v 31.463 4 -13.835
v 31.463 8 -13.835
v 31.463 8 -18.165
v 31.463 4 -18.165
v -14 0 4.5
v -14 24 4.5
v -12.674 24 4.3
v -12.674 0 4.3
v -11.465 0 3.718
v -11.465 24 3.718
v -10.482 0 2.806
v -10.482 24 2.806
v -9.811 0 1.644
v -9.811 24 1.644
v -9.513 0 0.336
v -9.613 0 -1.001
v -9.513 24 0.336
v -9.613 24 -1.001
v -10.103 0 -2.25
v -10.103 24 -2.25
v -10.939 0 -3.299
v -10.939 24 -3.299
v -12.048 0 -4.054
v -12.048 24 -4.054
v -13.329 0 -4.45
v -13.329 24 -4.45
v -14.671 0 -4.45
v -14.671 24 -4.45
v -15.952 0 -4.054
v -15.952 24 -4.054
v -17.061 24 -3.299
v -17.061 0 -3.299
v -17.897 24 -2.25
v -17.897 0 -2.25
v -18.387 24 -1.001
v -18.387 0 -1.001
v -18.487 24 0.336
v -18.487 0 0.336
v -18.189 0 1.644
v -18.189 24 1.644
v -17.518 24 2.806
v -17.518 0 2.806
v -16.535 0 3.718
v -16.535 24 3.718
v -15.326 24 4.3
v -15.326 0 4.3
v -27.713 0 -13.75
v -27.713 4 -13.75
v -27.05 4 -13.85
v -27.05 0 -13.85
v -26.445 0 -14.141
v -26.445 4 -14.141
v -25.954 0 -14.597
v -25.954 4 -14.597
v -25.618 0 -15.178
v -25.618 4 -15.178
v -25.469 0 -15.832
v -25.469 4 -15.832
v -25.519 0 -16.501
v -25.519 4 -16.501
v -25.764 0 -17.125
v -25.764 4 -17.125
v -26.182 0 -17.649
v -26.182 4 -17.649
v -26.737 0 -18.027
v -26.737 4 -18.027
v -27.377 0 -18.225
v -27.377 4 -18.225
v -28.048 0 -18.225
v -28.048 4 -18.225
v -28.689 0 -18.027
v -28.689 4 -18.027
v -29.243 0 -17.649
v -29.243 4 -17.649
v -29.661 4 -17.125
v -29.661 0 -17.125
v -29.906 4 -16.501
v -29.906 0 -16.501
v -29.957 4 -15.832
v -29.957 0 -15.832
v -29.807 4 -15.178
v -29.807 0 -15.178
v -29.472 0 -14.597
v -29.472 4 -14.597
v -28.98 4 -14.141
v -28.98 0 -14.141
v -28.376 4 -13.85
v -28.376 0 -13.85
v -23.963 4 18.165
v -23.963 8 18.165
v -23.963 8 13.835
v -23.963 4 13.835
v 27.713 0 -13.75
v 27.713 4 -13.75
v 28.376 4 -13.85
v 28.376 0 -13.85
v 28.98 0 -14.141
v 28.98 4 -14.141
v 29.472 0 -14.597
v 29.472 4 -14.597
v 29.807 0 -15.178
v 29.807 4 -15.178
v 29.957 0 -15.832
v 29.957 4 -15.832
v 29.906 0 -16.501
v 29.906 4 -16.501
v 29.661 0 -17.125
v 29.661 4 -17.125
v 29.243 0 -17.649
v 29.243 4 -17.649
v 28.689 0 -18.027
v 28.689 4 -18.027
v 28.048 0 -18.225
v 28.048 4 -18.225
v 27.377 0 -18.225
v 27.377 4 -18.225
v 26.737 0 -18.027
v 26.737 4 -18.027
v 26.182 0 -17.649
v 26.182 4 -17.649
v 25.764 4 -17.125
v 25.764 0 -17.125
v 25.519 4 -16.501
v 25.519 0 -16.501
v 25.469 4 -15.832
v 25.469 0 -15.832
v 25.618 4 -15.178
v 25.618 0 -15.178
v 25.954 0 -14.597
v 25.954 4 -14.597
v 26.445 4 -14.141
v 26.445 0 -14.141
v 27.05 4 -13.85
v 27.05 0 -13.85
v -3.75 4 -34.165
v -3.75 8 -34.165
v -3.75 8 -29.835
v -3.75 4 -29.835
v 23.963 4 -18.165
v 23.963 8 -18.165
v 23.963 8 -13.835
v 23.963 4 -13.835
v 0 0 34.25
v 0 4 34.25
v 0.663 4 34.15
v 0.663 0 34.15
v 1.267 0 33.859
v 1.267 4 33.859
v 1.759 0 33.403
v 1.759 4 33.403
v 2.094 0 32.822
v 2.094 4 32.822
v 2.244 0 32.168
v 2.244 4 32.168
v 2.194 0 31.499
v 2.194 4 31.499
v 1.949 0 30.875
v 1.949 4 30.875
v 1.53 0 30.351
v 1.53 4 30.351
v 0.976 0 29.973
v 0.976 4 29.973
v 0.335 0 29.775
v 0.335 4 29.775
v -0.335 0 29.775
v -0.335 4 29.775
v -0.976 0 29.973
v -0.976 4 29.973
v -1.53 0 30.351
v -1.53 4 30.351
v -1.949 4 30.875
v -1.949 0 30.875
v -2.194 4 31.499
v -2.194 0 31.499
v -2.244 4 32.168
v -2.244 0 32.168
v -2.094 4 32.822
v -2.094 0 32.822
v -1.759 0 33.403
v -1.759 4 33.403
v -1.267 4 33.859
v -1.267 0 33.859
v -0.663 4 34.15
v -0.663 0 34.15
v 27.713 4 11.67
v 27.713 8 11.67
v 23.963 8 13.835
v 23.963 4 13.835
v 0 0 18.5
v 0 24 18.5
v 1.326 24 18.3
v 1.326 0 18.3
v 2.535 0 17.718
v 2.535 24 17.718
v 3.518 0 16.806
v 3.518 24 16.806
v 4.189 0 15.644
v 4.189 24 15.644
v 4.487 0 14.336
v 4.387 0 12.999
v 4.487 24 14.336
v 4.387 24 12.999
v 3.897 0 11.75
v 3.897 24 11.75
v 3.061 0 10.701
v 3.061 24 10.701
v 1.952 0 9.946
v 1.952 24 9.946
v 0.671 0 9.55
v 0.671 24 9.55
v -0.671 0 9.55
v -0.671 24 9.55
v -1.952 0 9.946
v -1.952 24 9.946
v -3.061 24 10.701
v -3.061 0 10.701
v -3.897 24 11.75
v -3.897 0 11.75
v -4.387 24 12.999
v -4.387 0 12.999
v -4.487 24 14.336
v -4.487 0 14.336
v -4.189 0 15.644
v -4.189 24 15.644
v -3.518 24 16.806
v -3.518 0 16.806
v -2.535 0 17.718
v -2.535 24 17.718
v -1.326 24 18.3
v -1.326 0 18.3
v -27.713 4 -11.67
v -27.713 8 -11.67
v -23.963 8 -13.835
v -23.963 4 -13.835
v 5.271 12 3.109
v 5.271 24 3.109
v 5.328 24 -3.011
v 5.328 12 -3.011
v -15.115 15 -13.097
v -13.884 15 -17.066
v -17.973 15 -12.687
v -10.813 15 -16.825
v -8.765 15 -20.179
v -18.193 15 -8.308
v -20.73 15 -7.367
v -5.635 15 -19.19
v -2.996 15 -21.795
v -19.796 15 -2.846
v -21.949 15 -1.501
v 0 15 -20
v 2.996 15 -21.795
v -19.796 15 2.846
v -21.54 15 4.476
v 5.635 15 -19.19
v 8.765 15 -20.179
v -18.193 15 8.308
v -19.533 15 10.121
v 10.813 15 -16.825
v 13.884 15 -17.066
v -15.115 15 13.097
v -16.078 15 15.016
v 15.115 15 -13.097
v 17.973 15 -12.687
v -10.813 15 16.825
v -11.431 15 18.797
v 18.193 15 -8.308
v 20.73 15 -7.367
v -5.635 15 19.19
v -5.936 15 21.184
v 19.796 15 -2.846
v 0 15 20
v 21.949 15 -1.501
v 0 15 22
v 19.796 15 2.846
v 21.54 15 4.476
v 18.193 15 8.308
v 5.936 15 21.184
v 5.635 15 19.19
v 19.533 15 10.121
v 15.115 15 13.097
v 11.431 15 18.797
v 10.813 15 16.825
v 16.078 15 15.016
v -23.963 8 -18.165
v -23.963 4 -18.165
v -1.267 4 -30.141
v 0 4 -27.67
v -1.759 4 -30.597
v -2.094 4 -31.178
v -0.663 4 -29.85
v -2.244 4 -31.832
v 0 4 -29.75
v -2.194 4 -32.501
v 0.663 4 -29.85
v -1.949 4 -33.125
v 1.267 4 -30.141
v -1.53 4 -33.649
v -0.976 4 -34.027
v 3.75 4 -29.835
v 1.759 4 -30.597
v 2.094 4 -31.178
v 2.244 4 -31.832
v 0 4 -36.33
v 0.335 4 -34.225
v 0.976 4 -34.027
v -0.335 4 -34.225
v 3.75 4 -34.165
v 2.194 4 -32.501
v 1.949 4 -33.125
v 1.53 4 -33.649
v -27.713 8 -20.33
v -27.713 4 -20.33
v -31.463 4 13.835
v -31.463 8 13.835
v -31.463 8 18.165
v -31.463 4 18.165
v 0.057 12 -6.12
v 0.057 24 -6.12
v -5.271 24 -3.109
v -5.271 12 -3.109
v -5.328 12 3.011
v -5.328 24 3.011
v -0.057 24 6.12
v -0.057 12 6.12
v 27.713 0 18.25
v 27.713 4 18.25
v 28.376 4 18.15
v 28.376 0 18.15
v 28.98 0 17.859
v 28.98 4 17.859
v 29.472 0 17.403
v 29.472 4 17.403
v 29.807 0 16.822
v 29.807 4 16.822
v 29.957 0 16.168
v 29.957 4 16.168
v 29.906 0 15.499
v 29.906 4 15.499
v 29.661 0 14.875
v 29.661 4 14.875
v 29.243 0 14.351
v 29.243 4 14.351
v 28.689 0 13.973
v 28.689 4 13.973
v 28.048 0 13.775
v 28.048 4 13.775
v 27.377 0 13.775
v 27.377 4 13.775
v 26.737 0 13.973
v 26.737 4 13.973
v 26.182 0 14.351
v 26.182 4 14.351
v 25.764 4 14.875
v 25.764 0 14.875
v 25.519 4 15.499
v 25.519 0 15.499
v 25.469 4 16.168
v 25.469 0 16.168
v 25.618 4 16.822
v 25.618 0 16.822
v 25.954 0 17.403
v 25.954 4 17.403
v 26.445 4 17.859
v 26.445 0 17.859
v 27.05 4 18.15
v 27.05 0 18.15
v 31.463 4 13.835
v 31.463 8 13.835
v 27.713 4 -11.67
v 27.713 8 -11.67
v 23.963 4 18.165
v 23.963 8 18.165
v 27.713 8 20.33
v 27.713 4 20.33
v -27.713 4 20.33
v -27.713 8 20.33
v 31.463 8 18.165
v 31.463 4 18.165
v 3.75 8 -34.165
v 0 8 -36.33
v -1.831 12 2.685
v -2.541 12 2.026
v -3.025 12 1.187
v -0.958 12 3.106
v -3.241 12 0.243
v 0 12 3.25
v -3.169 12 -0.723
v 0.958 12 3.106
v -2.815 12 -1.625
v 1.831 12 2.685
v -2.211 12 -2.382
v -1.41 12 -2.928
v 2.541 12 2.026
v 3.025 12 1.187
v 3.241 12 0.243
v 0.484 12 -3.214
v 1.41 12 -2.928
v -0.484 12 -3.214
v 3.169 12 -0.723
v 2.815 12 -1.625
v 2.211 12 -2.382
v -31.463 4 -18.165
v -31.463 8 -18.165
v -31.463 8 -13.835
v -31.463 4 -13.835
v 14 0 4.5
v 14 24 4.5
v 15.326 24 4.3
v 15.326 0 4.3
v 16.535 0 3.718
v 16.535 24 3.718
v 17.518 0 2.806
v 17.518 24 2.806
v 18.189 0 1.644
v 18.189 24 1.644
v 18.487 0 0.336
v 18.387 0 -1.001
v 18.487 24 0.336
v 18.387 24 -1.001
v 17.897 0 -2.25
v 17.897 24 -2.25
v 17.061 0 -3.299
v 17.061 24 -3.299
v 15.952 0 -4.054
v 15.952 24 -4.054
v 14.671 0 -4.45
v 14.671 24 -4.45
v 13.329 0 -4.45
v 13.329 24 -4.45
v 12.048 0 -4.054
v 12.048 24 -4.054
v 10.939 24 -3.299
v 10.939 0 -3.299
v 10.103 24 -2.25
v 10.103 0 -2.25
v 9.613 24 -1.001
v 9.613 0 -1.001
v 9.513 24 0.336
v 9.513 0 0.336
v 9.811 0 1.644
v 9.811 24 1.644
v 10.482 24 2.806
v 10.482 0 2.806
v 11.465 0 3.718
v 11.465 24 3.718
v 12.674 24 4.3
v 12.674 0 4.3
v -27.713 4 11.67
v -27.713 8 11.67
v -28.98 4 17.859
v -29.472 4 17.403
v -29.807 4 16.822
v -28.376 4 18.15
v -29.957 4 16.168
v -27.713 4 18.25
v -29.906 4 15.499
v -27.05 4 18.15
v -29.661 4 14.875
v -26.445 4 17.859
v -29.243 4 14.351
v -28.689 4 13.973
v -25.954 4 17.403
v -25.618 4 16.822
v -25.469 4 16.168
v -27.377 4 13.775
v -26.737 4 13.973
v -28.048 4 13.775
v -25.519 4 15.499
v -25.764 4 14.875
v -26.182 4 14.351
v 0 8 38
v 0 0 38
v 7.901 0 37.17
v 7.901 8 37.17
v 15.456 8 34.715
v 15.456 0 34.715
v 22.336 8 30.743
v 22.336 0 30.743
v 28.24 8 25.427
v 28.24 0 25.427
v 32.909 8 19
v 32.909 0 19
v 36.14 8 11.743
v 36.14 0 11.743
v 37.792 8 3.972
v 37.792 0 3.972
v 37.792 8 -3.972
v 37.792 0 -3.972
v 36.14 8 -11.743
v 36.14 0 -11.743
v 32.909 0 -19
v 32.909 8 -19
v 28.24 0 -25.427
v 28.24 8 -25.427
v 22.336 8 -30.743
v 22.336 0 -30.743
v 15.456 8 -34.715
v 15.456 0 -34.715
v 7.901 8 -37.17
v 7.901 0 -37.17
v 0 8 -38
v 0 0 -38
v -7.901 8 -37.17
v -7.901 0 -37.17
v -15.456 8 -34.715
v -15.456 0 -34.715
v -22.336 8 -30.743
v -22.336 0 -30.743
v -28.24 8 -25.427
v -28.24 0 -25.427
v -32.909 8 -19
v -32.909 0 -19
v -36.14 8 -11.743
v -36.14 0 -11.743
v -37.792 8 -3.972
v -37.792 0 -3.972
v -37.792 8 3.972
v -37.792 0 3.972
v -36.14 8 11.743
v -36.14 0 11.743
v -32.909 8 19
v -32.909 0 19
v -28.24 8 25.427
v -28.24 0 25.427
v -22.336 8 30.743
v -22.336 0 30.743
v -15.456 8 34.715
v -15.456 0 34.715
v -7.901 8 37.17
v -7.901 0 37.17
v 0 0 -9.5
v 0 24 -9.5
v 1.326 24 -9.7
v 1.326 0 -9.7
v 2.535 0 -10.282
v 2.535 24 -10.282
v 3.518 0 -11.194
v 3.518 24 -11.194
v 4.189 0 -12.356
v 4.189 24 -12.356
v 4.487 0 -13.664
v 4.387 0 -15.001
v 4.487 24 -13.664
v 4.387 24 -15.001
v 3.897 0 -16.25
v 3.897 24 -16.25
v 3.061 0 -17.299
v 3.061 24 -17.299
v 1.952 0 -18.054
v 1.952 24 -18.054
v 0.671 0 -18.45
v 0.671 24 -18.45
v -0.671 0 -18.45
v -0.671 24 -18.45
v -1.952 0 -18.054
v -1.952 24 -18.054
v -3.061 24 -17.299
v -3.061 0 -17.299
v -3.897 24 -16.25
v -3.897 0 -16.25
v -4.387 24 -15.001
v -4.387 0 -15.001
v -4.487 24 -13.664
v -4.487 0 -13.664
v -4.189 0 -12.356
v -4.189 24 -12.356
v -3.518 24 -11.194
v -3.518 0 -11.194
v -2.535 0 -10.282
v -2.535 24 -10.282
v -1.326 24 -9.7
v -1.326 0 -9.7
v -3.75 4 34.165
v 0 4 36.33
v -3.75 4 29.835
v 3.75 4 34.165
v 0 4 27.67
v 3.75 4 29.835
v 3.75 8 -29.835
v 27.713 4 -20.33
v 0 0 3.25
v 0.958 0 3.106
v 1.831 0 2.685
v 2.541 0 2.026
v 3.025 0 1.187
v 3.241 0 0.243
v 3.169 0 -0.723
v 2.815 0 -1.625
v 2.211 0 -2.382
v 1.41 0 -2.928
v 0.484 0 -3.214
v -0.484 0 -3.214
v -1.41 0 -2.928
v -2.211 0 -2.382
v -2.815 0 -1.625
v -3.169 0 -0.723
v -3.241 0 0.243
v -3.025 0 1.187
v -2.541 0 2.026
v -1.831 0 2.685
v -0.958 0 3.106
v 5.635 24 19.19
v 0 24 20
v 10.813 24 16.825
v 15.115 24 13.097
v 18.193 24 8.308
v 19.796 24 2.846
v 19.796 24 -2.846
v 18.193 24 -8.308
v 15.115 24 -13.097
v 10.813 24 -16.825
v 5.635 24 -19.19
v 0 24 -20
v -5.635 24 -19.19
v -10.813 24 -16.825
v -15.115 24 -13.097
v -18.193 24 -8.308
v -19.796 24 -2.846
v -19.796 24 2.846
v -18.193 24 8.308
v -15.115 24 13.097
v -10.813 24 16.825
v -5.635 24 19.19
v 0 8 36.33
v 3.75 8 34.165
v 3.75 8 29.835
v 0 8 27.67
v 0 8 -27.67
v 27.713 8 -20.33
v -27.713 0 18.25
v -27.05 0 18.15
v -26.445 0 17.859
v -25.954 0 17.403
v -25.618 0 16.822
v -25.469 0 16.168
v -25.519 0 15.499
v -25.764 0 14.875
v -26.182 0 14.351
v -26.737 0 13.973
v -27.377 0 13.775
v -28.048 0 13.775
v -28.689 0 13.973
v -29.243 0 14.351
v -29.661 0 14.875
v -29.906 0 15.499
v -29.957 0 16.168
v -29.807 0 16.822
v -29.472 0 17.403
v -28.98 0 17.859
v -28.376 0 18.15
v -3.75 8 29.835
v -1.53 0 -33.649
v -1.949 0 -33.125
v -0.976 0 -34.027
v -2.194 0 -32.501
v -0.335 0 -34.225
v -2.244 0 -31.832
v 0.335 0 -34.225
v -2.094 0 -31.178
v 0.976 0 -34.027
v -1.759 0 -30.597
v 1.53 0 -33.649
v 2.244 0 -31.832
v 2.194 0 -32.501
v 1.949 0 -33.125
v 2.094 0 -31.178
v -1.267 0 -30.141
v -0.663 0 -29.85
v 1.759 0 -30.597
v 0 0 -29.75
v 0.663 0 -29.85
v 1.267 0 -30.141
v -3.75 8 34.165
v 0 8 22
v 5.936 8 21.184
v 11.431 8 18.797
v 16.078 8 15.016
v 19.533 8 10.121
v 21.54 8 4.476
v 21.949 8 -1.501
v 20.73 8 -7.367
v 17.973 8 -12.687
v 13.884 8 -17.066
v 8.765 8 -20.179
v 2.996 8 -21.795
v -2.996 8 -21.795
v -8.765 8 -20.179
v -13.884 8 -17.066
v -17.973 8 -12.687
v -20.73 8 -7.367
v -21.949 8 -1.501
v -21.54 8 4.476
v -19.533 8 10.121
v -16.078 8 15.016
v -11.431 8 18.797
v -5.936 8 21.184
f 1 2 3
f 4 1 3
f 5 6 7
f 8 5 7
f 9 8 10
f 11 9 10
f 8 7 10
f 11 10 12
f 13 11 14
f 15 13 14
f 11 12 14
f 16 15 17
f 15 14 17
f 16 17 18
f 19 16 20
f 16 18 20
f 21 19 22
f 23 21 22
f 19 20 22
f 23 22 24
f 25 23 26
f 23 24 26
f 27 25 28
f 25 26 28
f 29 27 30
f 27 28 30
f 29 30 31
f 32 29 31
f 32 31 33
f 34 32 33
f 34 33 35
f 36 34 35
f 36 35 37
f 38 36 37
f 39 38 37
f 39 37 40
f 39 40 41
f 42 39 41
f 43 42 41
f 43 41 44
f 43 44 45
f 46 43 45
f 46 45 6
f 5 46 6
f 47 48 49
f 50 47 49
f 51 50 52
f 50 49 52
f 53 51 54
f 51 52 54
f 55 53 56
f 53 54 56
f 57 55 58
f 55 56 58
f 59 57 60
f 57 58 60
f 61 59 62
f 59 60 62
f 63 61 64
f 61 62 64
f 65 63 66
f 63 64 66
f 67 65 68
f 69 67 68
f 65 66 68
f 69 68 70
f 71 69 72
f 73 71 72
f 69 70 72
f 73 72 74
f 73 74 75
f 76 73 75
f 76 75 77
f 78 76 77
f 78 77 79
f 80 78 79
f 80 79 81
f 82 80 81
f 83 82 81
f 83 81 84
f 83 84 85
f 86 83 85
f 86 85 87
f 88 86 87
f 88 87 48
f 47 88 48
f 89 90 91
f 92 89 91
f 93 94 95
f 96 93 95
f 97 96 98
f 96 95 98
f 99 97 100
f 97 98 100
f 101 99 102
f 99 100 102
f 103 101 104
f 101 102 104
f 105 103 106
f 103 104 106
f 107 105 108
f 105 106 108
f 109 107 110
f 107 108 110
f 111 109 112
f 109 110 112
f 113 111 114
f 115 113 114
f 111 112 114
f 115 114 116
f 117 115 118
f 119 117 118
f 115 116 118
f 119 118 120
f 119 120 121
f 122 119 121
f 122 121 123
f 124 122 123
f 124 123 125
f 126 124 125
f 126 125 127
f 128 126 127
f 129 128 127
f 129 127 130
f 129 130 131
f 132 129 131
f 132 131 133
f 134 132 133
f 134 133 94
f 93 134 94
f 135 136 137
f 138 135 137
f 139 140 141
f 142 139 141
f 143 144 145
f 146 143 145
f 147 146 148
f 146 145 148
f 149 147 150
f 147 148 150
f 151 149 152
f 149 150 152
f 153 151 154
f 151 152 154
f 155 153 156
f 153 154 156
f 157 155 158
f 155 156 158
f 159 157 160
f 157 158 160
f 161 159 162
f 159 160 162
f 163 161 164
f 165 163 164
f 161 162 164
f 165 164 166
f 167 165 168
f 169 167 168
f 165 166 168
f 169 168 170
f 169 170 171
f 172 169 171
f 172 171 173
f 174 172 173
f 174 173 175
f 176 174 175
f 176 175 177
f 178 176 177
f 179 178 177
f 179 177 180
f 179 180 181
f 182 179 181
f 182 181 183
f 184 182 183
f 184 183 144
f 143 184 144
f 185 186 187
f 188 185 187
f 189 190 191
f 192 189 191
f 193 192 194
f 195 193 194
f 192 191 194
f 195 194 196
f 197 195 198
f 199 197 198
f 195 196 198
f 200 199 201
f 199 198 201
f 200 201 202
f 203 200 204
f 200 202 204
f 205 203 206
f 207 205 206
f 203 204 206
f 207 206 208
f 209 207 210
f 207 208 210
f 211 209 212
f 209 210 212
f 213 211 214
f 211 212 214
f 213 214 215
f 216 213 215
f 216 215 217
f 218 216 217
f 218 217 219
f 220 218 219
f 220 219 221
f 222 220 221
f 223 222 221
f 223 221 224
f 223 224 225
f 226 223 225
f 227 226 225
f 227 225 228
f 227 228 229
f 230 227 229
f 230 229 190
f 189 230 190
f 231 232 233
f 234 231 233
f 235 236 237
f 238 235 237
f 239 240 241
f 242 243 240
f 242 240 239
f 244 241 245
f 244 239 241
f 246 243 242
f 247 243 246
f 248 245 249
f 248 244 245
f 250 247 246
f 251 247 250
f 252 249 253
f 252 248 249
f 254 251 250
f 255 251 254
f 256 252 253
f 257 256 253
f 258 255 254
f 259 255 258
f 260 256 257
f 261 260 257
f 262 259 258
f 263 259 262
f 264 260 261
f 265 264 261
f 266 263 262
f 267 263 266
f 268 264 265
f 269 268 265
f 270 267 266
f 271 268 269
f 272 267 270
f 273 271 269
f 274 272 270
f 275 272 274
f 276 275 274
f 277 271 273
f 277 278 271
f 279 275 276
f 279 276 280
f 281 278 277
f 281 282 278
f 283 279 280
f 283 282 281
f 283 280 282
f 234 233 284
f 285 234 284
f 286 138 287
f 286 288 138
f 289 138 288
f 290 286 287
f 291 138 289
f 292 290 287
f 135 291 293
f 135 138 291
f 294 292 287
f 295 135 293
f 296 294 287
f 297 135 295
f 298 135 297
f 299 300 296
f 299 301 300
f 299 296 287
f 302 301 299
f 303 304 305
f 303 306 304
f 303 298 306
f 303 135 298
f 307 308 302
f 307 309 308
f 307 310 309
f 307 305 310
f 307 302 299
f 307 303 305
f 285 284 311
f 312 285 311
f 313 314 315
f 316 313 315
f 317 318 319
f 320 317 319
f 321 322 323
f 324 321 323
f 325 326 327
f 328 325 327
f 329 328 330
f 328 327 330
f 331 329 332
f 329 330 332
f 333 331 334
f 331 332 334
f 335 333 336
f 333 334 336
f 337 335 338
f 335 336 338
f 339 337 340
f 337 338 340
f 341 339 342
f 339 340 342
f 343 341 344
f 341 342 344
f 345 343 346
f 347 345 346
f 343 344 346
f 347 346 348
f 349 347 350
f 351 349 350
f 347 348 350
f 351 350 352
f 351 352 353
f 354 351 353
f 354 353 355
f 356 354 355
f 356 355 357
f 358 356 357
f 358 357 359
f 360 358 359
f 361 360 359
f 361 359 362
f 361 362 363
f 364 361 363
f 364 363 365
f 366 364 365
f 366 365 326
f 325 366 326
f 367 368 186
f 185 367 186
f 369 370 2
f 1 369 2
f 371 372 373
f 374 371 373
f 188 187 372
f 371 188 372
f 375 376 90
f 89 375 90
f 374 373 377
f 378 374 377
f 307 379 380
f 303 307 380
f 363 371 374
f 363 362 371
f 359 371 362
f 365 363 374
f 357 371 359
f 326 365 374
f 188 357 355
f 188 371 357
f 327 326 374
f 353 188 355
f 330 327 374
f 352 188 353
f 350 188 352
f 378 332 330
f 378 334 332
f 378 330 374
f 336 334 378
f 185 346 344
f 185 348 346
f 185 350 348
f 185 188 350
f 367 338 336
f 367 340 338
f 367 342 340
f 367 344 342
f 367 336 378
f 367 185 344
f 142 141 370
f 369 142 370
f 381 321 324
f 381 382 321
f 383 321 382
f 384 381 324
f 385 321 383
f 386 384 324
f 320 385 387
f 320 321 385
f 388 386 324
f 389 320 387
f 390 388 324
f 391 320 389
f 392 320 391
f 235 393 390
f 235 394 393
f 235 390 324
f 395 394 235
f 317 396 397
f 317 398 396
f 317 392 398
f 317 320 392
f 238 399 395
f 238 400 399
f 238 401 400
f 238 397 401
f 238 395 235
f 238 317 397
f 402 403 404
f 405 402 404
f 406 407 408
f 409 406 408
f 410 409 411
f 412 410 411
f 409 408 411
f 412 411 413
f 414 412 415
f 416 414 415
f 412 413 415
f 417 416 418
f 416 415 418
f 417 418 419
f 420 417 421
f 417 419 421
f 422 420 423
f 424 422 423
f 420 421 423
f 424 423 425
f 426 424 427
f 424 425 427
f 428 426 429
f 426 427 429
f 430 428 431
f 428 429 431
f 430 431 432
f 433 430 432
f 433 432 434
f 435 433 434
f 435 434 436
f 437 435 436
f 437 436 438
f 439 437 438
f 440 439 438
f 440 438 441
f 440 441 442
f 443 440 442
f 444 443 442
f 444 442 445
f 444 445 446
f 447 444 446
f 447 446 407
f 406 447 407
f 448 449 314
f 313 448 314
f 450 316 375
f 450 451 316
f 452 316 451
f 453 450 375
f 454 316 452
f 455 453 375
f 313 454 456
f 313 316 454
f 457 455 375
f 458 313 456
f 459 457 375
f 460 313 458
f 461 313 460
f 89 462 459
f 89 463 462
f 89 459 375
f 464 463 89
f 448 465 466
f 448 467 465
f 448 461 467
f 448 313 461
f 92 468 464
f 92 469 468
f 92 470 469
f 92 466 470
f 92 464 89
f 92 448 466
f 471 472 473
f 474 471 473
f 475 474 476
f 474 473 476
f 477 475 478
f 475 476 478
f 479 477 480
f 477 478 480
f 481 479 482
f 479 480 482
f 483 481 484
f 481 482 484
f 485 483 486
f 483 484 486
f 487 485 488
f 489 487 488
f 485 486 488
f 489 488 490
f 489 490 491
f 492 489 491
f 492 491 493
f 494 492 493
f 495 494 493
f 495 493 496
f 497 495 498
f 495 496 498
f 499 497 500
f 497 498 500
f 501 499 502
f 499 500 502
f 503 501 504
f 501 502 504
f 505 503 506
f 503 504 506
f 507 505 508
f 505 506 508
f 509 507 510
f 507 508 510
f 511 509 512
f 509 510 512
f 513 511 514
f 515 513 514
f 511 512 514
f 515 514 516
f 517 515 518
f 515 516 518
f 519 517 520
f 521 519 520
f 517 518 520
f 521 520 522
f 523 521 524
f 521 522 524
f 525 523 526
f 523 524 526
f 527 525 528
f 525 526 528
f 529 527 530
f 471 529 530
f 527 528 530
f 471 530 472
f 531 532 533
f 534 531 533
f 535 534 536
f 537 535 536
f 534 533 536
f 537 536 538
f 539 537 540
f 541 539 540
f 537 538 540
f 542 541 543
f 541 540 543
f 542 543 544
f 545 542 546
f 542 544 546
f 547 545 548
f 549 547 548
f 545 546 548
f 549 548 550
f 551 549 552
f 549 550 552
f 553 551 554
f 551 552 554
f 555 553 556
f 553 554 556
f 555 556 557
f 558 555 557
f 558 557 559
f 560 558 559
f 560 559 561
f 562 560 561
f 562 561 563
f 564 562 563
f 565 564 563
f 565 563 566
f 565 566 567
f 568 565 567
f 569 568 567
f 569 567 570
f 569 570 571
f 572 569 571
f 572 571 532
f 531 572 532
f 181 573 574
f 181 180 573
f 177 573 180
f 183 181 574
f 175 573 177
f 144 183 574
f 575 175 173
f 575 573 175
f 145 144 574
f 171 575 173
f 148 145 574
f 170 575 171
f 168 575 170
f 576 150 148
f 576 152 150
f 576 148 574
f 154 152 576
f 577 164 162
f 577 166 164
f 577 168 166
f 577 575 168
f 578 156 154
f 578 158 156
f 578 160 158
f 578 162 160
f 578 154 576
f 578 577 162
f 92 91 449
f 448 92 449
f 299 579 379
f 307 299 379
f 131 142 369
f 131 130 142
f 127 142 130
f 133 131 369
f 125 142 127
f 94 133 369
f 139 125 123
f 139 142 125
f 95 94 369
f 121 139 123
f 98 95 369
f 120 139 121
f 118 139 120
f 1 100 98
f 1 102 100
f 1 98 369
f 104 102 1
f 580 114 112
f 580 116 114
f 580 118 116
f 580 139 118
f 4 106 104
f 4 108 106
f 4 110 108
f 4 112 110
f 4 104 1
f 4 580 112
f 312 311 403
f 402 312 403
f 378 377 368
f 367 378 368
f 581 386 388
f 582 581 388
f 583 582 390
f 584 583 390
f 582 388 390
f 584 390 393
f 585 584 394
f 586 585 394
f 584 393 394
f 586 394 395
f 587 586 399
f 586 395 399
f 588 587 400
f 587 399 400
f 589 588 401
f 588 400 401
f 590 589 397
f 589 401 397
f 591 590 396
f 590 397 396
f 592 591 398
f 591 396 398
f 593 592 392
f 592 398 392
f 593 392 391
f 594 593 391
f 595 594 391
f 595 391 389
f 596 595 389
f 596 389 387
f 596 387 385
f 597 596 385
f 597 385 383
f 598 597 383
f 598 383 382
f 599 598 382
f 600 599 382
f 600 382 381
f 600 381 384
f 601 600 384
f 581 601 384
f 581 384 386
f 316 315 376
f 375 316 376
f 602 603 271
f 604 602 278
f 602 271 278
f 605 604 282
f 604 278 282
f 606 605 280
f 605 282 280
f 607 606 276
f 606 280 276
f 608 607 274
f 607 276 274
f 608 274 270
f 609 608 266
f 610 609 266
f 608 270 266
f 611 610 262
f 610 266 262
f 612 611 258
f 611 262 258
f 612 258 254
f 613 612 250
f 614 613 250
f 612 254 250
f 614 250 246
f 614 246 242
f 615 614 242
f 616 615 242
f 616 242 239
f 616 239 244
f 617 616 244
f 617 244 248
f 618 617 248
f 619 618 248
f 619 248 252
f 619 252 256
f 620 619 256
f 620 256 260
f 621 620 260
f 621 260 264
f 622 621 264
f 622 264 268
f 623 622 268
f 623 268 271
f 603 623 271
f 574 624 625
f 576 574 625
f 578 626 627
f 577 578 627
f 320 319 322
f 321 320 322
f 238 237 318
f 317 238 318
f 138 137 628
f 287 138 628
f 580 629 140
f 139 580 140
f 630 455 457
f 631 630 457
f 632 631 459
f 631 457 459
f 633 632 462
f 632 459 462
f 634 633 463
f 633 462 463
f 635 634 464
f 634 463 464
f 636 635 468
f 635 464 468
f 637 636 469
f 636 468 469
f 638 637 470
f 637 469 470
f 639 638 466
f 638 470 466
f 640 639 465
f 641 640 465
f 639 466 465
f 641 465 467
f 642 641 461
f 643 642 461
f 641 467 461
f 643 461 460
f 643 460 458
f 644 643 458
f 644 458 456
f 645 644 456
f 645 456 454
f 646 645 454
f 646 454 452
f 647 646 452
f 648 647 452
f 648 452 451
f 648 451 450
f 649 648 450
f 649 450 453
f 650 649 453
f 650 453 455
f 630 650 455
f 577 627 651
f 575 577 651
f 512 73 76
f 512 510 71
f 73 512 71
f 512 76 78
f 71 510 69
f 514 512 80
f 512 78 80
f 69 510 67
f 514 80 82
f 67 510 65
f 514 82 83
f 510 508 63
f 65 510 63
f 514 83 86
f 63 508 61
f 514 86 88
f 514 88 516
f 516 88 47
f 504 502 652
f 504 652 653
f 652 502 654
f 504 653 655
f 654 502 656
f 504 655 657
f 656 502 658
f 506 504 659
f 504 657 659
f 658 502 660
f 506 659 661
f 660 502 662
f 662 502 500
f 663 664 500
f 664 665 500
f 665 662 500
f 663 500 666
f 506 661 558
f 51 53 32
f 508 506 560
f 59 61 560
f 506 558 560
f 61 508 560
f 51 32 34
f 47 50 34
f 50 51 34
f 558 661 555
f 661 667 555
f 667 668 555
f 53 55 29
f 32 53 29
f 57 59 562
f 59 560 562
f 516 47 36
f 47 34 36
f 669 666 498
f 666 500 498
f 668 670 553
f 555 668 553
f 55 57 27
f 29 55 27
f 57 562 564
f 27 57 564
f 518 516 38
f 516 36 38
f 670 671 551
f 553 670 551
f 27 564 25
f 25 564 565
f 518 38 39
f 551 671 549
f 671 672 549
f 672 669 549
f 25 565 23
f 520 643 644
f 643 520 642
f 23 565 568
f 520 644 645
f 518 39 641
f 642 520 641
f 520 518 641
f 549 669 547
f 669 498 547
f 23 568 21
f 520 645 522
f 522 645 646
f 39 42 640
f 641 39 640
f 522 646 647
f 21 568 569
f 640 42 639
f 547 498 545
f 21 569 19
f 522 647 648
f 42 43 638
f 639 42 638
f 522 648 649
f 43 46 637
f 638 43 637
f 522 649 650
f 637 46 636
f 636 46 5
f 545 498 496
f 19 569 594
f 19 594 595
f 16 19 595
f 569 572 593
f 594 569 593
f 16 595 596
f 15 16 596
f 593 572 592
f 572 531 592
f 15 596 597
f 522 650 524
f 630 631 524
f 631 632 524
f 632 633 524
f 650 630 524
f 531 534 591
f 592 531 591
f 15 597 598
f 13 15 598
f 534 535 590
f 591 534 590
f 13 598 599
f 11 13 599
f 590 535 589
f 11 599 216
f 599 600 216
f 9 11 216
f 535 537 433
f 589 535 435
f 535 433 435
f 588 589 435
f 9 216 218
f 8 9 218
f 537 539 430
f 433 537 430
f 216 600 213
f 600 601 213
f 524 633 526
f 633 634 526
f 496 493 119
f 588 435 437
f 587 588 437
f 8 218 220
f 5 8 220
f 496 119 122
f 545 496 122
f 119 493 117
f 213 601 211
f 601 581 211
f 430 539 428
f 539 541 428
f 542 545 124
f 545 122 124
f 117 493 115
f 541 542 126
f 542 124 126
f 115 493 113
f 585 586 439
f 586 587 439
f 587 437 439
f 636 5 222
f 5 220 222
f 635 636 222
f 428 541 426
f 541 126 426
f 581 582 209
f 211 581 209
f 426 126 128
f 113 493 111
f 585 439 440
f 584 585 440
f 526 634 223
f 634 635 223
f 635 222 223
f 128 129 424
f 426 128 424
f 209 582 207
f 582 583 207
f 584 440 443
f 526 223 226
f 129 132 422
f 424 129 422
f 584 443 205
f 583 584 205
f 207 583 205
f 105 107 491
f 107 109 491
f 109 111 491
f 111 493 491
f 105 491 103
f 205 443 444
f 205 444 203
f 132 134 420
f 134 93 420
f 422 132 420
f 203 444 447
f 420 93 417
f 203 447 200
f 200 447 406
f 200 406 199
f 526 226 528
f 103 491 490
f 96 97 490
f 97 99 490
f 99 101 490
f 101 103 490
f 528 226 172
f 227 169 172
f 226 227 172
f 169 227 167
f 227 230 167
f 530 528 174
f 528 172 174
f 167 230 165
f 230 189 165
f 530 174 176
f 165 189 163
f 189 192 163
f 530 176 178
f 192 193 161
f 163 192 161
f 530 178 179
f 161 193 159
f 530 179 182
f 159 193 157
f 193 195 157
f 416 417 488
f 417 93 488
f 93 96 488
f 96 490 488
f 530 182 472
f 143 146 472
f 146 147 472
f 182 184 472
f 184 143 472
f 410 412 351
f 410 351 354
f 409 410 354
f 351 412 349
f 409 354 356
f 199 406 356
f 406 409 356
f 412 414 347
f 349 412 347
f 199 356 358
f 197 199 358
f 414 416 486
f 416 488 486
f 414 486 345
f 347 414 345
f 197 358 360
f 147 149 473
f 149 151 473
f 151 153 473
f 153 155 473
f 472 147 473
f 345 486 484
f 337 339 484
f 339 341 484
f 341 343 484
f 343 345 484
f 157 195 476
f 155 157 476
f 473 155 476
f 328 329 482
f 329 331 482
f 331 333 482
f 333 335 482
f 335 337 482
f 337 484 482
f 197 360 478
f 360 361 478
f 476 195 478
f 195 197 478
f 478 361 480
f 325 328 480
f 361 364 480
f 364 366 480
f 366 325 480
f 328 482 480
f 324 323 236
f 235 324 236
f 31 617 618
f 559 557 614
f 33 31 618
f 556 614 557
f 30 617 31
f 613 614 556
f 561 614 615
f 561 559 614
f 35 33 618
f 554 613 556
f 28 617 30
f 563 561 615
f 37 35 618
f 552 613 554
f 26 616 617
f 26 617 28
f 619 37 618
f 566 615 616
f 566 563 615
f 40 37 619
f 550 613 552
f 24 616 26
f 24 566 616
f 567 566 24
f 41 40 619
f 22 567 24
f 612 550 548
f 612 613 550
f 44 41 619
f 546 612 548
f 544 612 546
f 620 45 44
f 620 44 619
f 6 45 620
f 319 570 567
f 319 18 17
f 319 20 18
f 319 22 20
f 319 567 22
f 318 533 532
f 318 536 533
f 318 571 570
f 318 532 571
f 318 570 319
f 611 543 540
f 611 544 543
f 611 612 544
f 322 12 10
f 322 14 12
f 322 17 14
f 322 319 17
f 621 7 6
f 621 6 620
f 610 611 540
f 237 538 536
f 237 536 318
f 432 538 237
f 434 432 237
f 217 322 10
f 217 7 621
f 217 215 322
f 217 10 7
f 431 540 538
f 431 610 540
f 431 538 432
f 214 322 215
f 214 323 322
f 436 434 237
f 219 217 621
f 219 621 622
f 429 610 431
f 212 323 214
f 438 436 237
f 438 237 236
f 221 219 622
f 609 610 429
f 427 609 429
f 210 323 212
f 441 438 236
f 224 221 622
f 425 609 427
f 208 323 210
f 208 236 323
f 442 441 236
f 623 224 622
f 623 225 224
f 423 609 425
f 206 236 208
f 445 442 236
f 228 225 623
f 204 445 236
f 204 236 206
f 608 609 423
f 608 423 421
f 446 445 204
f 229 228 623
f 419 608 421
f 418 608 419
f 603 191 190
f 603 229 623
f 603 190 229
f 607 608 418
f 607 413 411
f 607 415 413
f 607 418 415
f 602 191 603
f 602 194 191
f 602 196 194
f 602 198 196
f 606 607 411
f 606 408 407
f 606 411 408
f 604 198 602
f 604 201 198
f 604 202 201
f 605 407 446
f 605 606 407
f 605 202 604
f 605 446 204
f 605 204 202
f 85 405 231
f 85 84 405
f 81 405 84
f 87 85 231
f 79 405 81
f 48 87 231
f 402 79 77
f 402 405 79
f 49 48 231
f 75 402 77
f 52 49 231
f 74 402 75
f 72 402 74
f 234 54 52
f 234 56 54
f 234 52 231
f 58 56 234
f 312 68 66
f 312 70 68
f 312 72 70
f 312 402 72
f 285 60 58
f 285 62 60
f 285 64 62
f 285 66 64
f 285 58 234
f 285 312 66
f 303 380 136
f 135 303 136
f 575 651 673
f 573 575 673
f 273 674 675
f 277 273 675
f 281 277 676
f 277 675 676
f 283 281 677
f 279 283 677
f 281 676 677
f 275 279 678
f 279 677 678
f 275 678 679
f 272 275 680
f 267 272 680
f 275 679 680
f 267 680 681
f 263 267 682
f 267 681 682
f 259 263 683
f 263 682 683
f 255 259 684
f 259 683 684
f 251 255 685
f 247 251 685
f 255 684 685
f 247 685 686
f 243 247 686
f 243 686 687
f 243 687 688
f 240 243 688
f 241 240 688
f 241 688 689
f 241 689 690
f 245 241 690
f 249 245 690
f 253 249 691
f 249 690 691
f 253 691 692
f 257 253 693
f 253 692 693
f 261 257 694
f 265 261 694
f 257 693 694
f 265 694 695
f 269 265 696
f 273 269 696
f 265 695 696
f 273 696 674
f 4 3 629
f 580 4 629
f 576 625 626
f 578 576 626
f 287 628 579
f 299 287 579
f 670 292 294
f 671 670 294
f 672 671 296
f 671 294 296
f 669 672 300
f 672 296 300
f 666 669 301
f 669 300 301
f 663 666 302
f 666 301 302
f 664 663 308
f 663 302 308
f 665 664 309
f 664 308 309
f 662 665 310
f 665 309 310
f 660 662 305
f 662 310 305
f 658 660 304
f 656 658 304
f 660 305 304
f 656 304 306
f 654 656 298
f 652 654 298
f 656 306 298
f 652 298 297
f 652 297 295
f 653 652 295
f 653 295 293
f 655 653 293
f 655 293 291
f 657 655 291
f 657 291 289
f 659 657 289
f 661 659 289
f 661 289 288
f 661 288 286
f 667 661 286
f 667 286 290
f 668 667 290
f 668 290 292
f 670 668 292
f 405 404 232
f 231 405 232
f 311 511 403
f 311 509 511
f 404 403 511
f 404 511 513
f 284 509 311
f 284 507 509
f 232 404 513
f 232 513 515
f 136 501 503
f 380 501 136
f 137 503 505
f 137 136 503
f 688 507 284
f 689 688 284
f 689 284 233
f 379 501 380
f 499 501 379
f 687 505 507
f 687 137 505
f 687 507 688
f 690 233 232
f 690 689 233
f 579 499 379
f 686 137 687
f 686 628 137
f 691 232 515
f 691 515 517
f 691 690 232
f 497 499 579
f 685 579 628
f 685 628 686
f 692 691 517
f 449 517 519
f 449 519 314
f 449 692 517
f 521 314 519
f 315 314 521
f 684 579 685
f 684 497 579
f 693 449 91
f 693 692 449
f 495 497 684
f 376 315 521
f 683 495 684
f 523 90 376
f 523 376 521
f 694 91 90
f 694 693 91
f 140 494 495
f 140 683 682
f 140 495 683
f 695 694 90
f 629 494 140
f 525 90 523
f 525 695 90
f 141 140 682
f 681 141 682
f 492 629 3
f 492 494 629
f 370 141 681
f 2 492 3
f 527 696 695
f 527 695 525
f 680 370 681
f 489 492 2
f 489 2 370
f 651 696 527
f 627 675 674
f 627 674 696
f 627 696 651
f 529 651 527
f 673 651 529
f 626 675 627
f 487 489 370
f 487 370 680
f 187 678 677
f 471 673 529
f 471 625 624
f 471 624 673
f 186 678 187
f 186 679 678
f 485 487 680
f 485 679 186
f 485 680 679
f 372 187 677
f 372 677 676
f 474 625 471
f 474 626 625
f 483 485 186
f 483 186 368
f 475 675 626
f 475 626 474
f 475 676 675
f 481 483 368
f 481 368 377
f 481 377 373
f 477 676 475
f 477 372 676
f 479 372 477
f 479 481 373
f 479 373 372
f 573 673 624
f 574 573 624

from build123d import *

# Parameters (mm, degrees)
SKETCH_1_R          = 38
EXTRUDE_1_DEPTH     = 8
SKETCH_2_R          = 20
EXTRUDE_2_DEPTH     = 16
SKETCH_7_R          = 22
EXTRUDE_3_DEPTH     = 7
SKETCH_3_R          = 4.5
SKETCH_3_R_2        = 3.25
CUT_EXTRUDE_1_DEPTH = 59.855755878
CUT_EXTRUDE_2_DEPTH = 12
SKETCH_5_R          = 2.25
CUT_EXTRUDE_3_DEPTH = 59.855755878
CUT_EXTRUDE_4_DEPTH = 4


with BuildPart() as part:
    # Эскиз1 → Бобышка-Вытянуть1 (new body)
    with BuildSketch(Plane(origin=(0, 0, 0), x_dir=(1, 0, 0), z_dir=(0, 1, 0))):
        with Locations(Location((0, 0, 0), (0, 0, 270))):
            Circle(SKETCH_1_R)
    extrude(amount=EXTRUDE_1_DEPTH)

    # Эскиз2 → Бобышка-Вытянуть2 (add)
    with BuildSketch(Plane(origin=(0, 8, 0), x_dir=(1, 0, 0), z_dir=(0, 1, 0))):
        with Locations(Location((0, 0, 0), (0, 0, 270))):
            Circle(SKETCH_2_R)
    extrude(amount=EXTRUDE_2_DEPTH)

    # Эскиз7 → Бобышка-Вытянуть3 (add)
    with BuildSketch(Plane(origin=(0, 8, 0), x_dir=(1, 0, 0), z_dir=(0, 1, 0))):
        with Locations(Location((0, 0, 0), (0, 0, 270))):
            Circle(SKETCH_7_R)
    extrude(amount=EXTRUDE_3_DEPTH)

    # Эскиз3 → Вырез-Вытянуть1 (cut, through all)
    with BuildSketch(Plane(origin=(0, 24, 0), x_dir=(1, 0, 0), z_dir=(0, 1, 0))):
        with Locations(Location((0, 14, 0), (0, 0, 270))):
            Circle(SKETCH_3_R)
        with Locations(Location((14, 0, 0), (0, 0, 270))):
            Circle(SKETCH_3_R)
        with Locations(Location((0, -14, 0), (0, 0, 270))):
            Circle(SKETCH_3_R)
        with Locations(Location((-14, 0, 0), (0, 0, 270))):
            Circle(SKETCH_3_R)
        with Locations(Location((0, 0, 0), (0, 0, 270))):
            Circle(SKETCH_3_R_2)
    extrude(amount=-CUT_EXTRUDE_1_DEPTH, mode=Mode.SUBTRACT)

    # Эскиз4 → Вырез-Вытянуть2 (cut)
    with BuildSketch(Plane(origin=(0, 24, 0), x_dir=(1, 0, 0), z_dir=(0, 1, 0))):
        Polygon((5.271310529, -3.109118628), (5.32823098, 3.010529515), (0.056920451, 6.119648143), (-5.271310529, 3.109118628), (-5.32823098, -3.010529515), (-0.056920451, -6.119648143), align=None)
    extrude(amount=-CUT_EXTRUDE_2_DEPTH, mode=Mode.SUBTRACT)

    # Эскиз5 → Вырез-Вытянуть3 (cut, through all)
    with BuildSketch(Plane(origin=(0, 24, 0), x_dir=(1, 0, 0), z_dir=(0, 1, 0))):
        with Locations(Location((0, 32, 0), (0, 0, 270))):
            Circle(SKETCH_5_R)
        with Locations(Location((27.712812921, 16, 0), (0, 0, 270))):
            Circle(SKETCH_5_R)
        with Locations(Location((27.712812921, -16, 0), (0, 0, 270))):
            Circle(SKETCH_5_R)
        with Locations(Location((0, -32, 0), (0, 0, 270))):
            Circle(SKETCH_5_R)
        with Locations(Location((-27.712812921, -16, 0), (0, 0, 270))):
            Circle(SKETCH_5_R)
        with Locations(Location((-27.712812921, 16, 0), (0, 0, 270))):
            Circle(SKETCH_5_R)
    extrude(amount=-CUT_EXTRUDE_3_DEPTH, mode=Mode.SUBTRACT)

    # Эскиз6 → Вырез-Вытянуть4 (cut)
    with BuildSketch(Plane(origin=(0, 8, 0), x_dir=(1, 0, 0), z_dir=(0, 1, 0))):
        Polygon((27.712812921, 11.669872981), (31.462812921, 13.834936491), (31.462812921, 18.165063509), (27.712812921, 20.330127019), (23.962812921, 18.165063509), (23.962812921, 13.834936491), align=None)
        Polygon((3.75, 29.834936491), (3.75, 34.165063509), (0, 36.330127019), (-3.75, 34.165063509), (-3.75, 29.834936491), (0, 27.669872981), align=None)
        Polygon((23.962812921, -18.165063509), (27.712812921, -20.330127019), (31.462812921, -18.165063509), (31.462812921, -13.834936491), (27.712812921, -11.669872981), (23.962812921, -13.834936491), align=None)
        Polygon((-3.75, -29.834936491), (-3.75, -34.165063509), (0, -36.330127019), (3.75, -34.165063509), (3.75, -29.834936491), (0, -27.669872981), align=None)
        Polygon((-27.712812921, -11.669872981), (-31.462812921, -13.834936491), (-31.462812921, -18.165063509), (-27.712812921, -20.330127019), (-23.962812921, -18.165063509), (-23.962812921, -13.834936491), align=None)
        Polygon((-23.962812921, 18.165063509), (-27.712812921, 20.330127019), (-31.462812921, 18.165063509), (-31.462812921, 13.834936491), (-27.712812921, 11.669872981), (-23.962812921, 13.834936491), align=None)
    extrude(amount=-CUT_EXTRUDE_4_DEPTH, mode=Mode.SUBTRACT)


solid = part.part
